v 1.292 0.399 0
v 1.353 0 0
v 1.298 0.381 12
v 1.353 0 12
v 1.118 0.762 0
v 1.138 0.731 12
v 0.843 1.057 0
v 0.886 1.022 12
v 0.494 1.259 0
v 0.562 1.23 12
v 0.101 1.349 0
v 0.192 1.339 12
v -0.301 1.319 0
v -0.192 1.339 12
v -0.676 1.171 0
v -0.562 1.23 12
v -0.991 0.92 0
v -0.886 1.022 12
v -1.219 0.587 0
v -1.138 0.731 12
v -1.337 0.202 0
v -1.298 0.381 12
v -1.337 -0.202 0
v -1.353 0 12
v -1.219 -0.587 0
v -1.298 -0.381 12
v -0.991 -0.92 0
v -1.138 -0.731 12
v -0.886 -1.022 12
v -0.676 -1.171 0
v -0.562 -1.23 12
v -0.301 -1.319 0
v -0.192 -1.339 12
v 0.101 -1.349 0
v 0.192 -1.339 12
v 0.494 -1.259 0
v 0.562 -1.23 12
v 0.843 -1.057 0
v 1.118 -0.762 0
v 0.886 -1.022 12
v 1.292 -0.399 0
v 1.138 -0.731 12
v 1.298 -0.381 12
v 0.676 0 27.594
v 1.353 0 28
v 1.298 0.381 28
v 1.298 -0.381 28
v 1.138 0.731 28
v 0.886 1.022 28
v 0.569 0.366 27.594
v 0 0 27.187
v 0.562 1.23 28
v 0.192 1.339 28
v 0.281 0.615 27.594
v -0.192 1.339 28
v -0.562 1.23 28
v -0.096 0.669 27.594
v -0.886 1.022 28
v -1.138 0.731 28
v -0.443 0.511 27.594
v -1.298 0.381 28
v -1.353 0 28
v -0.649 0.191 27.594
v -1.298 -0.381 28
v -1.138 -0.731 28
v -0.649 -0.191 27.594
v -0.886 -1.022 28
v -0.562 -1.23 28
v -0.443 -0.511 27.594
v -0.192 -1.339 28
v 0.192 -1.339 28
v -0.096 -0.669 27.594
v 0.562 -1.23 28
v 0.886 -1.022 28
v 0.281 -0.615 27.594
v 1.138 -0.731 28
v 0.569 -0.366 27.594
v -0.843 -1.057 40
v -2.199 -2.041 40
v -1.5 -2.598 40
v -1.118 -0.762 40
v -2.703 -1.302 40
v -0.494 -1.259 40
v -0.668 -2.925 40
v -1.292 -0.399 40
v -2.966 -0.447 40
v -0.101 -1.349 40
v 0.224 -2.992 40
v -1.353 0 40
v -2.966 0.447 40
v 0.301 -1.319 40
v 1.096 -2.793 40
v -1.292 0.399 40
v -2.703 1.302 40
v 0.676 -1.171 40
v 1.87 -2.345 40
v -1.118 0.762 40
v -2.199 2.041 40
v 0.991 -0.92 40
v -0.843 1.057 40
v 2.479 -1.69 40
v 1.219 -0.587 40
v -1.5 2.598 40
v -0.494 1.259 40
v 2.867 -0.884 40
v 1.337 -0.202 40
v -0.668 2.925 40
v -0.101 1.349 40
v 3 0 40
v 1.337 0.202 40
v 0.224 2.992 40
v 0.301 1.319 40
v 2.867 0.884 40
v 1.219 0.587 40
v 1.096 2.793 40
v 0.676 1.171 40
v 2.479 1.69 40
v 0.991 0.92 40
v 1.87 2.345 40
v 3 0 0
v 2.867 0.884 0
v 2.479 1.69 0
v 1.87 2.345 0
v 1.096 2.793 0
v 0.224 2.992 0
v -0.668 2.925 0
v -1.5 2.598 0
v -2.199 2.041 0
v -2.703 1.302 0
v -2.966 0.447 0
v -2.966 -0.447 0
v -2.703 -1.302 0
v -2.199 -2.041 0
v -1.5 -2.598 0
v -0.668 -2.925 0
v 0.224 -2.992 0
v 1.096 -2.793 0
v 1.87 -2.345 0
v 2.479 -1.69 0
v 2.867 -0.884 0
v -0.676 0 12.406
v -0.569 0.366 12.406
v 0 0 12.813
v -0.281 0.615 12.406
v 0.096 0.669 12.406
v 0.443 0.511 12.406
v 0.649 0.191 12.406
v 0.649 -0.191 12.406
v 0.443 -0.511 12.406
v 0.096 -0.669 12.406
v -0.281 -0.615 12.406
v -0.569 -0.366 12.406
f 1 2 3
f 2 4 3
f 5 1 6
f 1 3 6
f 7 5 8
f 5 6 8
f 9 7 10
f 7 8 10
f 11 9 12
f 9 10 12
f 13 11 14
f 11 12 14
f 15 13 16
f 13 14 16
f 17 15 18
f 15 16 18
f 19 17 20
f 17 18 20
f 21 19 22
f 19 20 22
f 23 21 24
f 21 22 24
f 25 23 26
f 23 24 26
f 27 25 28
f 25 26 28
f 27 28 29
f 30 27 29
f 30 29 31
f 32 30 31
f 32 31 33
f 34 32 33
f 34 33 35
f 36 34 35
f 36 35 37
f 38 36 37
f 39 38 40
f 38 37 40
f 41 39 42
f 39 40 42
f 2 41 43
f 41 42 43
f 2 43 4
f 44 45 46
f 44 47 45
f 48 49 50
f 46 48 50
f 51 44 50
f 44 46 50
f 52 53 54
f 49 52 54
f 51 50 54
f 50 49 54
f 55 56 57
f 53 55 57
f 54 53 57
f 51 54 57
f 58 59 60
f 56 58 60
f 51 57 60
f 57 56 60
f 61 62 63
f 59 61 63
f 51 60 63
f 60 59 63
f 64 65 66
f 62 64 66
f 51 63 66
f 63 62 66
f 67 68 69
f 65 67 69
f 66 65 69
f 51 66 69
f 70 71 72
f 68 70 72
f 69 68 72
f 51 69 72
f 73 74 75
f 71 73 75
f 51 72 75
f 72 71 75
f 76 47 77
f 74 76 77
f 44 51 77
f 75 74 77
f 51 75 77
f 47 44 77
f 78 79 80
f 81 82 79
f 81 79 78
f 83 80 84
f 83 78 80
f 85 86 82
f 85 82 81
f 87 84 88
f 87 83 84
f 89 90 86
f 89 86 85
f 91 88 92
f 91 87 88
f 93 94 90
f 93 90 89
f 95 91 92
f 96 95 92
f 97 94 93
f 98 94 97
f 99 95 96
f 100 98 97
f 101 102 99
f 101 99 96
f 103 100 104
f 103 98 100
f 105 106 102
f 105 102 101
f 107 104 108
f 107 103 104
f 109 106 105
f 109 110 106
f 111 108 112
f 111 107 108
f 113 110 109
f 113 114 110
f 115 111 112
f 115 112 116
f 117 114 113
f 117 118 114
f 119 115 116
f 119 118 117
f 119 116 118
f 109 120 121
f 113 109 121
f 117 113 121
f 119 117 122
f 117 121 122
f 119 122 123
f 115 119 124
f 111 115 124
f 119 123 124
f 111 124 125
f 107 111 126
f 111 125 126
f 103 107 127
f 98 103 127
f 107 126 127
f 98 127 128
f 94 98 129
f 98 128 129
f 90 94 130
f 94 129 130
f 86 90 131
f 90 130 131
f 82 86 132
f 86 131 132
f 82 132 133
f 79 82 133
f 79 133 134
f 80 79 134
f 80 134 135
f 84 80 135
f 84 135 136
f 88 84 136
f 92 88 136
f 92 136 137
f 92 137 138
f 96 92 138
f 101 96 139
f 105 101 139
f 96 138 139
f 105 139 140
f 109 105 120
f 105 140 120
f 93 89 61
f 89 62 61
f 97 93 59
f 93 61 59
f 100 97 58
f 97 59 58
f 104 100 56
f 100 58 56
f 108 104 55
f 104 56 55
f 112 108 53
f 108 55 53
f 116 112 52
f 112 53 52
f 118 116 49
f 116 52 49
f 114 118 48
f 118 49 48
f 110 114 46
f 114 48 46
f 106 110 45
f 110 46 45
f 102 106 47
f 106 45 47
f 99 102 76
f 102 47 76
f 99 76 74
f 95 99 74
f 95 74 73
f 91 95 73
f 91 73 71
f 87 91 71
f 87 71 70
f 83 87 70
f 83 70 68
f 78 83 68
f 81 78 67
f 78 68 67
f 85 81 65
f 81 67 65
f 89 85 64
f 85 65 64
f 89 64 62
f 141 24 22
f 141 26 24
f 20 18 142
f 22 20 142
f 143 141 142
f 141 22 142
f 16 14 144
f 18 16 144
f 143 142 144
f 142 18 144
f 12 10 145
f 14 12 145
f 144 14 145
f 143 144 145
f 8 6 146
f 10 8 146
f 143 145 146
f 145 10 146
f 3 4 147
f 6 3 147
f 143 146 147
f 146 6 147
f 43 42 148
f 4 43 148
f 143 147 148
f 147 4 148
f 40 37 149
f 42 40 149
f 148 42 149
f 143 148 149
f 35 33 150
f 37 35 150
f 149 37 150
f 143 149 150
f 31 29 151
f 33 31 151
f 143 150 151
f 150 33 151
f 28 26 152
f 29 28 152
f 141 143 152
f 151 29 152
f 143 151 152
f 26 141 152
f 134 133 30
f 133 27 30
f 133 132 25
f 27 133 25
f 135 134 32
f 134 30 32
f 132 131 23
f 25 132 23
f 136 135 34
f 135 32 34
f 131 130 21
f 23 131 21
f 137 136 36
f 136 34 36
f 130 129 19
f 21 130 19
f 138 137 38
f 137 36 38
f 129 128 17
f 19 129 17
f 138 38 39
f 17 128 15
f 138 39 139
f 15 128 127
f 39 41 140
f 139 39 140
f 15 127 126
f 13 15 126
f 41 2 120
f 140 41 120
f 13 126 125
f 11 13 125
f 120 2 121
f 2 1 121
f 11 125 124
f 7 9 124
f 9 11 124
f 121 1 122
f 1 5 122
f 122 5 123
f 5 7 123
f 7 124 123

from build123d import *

# Parameters (mm, degrees)
SKETCH1_R                 = 3
BOSS_EXTRUDE1_DEPTH       = 40
F_6_32_TAPPED_HOLE1_D     = 2.7051
F_6_32_TAPPED_HOLE1_DEPTH = 12
F_6_32_TAPPED_HOLE1_TIP   = 0.81269403
F_6_32_TAPPED_HOLE2_D     = 2.7051
F_6_32_TAPPED_HOLE2_DEPTH = 12
F_6_32_TAPPED_HOLE2_TIP   = 0.81269403


with BuildPart() as part:
    # Sketch1 → Boss-Extrude1 (new body)
    with BuildSketch(Plane.XY):
        Circle(SKETCH1_R)
    extrude(amount=BOSS_EXTRUDE1_DEPTH)

    # #6-32 Tapped Hole1
    with Locations(Plane(origin=(0, 0, 0), x_dir=(-1, 0, 0), z_dir=(0, 0, -1))):
        with Locations((0, 0)):
            Hole(F_6_32_TAPPED_HOLE1_D / 2, depth=F_6_32_TAPPED_HOLE1_DEPTH)
            with Locations((0, 0, -(F_6_32_TAPPED_HOLE1_DEPTH + F_6_32_TAPPED_HOLE1_TIP / 2))):  # 118° drill point
                Cone(0, F_6_32_TAPPED_HOLE1_D / 2, F_6_32_TAPPED_HOLE1_TIP, mode=Mode.SUBTRACT)

    # #6-32 Tapped Hole2
    with Locations(Plane.XY.offset(40)):
        with Locations((0, 0)):
            Hole(F_6_32_TAPPED_HOLE2_D / 2, depth=F_6_32_TAPPED_HOLE2_DEPTH)
            with Locations((0, 0, -(F_6_32_TAPPED_HOLE2_DEPTH + F_6_32_TAPPED_HOLE2_TIP / 2))):  # 118° drill point
                Cone(0, F_6_32_TAPPED_HOLE2_D / 2, F_6_32_TAPPED_HOLE2_TIP, mode=Mode.SUBTRACT)


solid = part.part
